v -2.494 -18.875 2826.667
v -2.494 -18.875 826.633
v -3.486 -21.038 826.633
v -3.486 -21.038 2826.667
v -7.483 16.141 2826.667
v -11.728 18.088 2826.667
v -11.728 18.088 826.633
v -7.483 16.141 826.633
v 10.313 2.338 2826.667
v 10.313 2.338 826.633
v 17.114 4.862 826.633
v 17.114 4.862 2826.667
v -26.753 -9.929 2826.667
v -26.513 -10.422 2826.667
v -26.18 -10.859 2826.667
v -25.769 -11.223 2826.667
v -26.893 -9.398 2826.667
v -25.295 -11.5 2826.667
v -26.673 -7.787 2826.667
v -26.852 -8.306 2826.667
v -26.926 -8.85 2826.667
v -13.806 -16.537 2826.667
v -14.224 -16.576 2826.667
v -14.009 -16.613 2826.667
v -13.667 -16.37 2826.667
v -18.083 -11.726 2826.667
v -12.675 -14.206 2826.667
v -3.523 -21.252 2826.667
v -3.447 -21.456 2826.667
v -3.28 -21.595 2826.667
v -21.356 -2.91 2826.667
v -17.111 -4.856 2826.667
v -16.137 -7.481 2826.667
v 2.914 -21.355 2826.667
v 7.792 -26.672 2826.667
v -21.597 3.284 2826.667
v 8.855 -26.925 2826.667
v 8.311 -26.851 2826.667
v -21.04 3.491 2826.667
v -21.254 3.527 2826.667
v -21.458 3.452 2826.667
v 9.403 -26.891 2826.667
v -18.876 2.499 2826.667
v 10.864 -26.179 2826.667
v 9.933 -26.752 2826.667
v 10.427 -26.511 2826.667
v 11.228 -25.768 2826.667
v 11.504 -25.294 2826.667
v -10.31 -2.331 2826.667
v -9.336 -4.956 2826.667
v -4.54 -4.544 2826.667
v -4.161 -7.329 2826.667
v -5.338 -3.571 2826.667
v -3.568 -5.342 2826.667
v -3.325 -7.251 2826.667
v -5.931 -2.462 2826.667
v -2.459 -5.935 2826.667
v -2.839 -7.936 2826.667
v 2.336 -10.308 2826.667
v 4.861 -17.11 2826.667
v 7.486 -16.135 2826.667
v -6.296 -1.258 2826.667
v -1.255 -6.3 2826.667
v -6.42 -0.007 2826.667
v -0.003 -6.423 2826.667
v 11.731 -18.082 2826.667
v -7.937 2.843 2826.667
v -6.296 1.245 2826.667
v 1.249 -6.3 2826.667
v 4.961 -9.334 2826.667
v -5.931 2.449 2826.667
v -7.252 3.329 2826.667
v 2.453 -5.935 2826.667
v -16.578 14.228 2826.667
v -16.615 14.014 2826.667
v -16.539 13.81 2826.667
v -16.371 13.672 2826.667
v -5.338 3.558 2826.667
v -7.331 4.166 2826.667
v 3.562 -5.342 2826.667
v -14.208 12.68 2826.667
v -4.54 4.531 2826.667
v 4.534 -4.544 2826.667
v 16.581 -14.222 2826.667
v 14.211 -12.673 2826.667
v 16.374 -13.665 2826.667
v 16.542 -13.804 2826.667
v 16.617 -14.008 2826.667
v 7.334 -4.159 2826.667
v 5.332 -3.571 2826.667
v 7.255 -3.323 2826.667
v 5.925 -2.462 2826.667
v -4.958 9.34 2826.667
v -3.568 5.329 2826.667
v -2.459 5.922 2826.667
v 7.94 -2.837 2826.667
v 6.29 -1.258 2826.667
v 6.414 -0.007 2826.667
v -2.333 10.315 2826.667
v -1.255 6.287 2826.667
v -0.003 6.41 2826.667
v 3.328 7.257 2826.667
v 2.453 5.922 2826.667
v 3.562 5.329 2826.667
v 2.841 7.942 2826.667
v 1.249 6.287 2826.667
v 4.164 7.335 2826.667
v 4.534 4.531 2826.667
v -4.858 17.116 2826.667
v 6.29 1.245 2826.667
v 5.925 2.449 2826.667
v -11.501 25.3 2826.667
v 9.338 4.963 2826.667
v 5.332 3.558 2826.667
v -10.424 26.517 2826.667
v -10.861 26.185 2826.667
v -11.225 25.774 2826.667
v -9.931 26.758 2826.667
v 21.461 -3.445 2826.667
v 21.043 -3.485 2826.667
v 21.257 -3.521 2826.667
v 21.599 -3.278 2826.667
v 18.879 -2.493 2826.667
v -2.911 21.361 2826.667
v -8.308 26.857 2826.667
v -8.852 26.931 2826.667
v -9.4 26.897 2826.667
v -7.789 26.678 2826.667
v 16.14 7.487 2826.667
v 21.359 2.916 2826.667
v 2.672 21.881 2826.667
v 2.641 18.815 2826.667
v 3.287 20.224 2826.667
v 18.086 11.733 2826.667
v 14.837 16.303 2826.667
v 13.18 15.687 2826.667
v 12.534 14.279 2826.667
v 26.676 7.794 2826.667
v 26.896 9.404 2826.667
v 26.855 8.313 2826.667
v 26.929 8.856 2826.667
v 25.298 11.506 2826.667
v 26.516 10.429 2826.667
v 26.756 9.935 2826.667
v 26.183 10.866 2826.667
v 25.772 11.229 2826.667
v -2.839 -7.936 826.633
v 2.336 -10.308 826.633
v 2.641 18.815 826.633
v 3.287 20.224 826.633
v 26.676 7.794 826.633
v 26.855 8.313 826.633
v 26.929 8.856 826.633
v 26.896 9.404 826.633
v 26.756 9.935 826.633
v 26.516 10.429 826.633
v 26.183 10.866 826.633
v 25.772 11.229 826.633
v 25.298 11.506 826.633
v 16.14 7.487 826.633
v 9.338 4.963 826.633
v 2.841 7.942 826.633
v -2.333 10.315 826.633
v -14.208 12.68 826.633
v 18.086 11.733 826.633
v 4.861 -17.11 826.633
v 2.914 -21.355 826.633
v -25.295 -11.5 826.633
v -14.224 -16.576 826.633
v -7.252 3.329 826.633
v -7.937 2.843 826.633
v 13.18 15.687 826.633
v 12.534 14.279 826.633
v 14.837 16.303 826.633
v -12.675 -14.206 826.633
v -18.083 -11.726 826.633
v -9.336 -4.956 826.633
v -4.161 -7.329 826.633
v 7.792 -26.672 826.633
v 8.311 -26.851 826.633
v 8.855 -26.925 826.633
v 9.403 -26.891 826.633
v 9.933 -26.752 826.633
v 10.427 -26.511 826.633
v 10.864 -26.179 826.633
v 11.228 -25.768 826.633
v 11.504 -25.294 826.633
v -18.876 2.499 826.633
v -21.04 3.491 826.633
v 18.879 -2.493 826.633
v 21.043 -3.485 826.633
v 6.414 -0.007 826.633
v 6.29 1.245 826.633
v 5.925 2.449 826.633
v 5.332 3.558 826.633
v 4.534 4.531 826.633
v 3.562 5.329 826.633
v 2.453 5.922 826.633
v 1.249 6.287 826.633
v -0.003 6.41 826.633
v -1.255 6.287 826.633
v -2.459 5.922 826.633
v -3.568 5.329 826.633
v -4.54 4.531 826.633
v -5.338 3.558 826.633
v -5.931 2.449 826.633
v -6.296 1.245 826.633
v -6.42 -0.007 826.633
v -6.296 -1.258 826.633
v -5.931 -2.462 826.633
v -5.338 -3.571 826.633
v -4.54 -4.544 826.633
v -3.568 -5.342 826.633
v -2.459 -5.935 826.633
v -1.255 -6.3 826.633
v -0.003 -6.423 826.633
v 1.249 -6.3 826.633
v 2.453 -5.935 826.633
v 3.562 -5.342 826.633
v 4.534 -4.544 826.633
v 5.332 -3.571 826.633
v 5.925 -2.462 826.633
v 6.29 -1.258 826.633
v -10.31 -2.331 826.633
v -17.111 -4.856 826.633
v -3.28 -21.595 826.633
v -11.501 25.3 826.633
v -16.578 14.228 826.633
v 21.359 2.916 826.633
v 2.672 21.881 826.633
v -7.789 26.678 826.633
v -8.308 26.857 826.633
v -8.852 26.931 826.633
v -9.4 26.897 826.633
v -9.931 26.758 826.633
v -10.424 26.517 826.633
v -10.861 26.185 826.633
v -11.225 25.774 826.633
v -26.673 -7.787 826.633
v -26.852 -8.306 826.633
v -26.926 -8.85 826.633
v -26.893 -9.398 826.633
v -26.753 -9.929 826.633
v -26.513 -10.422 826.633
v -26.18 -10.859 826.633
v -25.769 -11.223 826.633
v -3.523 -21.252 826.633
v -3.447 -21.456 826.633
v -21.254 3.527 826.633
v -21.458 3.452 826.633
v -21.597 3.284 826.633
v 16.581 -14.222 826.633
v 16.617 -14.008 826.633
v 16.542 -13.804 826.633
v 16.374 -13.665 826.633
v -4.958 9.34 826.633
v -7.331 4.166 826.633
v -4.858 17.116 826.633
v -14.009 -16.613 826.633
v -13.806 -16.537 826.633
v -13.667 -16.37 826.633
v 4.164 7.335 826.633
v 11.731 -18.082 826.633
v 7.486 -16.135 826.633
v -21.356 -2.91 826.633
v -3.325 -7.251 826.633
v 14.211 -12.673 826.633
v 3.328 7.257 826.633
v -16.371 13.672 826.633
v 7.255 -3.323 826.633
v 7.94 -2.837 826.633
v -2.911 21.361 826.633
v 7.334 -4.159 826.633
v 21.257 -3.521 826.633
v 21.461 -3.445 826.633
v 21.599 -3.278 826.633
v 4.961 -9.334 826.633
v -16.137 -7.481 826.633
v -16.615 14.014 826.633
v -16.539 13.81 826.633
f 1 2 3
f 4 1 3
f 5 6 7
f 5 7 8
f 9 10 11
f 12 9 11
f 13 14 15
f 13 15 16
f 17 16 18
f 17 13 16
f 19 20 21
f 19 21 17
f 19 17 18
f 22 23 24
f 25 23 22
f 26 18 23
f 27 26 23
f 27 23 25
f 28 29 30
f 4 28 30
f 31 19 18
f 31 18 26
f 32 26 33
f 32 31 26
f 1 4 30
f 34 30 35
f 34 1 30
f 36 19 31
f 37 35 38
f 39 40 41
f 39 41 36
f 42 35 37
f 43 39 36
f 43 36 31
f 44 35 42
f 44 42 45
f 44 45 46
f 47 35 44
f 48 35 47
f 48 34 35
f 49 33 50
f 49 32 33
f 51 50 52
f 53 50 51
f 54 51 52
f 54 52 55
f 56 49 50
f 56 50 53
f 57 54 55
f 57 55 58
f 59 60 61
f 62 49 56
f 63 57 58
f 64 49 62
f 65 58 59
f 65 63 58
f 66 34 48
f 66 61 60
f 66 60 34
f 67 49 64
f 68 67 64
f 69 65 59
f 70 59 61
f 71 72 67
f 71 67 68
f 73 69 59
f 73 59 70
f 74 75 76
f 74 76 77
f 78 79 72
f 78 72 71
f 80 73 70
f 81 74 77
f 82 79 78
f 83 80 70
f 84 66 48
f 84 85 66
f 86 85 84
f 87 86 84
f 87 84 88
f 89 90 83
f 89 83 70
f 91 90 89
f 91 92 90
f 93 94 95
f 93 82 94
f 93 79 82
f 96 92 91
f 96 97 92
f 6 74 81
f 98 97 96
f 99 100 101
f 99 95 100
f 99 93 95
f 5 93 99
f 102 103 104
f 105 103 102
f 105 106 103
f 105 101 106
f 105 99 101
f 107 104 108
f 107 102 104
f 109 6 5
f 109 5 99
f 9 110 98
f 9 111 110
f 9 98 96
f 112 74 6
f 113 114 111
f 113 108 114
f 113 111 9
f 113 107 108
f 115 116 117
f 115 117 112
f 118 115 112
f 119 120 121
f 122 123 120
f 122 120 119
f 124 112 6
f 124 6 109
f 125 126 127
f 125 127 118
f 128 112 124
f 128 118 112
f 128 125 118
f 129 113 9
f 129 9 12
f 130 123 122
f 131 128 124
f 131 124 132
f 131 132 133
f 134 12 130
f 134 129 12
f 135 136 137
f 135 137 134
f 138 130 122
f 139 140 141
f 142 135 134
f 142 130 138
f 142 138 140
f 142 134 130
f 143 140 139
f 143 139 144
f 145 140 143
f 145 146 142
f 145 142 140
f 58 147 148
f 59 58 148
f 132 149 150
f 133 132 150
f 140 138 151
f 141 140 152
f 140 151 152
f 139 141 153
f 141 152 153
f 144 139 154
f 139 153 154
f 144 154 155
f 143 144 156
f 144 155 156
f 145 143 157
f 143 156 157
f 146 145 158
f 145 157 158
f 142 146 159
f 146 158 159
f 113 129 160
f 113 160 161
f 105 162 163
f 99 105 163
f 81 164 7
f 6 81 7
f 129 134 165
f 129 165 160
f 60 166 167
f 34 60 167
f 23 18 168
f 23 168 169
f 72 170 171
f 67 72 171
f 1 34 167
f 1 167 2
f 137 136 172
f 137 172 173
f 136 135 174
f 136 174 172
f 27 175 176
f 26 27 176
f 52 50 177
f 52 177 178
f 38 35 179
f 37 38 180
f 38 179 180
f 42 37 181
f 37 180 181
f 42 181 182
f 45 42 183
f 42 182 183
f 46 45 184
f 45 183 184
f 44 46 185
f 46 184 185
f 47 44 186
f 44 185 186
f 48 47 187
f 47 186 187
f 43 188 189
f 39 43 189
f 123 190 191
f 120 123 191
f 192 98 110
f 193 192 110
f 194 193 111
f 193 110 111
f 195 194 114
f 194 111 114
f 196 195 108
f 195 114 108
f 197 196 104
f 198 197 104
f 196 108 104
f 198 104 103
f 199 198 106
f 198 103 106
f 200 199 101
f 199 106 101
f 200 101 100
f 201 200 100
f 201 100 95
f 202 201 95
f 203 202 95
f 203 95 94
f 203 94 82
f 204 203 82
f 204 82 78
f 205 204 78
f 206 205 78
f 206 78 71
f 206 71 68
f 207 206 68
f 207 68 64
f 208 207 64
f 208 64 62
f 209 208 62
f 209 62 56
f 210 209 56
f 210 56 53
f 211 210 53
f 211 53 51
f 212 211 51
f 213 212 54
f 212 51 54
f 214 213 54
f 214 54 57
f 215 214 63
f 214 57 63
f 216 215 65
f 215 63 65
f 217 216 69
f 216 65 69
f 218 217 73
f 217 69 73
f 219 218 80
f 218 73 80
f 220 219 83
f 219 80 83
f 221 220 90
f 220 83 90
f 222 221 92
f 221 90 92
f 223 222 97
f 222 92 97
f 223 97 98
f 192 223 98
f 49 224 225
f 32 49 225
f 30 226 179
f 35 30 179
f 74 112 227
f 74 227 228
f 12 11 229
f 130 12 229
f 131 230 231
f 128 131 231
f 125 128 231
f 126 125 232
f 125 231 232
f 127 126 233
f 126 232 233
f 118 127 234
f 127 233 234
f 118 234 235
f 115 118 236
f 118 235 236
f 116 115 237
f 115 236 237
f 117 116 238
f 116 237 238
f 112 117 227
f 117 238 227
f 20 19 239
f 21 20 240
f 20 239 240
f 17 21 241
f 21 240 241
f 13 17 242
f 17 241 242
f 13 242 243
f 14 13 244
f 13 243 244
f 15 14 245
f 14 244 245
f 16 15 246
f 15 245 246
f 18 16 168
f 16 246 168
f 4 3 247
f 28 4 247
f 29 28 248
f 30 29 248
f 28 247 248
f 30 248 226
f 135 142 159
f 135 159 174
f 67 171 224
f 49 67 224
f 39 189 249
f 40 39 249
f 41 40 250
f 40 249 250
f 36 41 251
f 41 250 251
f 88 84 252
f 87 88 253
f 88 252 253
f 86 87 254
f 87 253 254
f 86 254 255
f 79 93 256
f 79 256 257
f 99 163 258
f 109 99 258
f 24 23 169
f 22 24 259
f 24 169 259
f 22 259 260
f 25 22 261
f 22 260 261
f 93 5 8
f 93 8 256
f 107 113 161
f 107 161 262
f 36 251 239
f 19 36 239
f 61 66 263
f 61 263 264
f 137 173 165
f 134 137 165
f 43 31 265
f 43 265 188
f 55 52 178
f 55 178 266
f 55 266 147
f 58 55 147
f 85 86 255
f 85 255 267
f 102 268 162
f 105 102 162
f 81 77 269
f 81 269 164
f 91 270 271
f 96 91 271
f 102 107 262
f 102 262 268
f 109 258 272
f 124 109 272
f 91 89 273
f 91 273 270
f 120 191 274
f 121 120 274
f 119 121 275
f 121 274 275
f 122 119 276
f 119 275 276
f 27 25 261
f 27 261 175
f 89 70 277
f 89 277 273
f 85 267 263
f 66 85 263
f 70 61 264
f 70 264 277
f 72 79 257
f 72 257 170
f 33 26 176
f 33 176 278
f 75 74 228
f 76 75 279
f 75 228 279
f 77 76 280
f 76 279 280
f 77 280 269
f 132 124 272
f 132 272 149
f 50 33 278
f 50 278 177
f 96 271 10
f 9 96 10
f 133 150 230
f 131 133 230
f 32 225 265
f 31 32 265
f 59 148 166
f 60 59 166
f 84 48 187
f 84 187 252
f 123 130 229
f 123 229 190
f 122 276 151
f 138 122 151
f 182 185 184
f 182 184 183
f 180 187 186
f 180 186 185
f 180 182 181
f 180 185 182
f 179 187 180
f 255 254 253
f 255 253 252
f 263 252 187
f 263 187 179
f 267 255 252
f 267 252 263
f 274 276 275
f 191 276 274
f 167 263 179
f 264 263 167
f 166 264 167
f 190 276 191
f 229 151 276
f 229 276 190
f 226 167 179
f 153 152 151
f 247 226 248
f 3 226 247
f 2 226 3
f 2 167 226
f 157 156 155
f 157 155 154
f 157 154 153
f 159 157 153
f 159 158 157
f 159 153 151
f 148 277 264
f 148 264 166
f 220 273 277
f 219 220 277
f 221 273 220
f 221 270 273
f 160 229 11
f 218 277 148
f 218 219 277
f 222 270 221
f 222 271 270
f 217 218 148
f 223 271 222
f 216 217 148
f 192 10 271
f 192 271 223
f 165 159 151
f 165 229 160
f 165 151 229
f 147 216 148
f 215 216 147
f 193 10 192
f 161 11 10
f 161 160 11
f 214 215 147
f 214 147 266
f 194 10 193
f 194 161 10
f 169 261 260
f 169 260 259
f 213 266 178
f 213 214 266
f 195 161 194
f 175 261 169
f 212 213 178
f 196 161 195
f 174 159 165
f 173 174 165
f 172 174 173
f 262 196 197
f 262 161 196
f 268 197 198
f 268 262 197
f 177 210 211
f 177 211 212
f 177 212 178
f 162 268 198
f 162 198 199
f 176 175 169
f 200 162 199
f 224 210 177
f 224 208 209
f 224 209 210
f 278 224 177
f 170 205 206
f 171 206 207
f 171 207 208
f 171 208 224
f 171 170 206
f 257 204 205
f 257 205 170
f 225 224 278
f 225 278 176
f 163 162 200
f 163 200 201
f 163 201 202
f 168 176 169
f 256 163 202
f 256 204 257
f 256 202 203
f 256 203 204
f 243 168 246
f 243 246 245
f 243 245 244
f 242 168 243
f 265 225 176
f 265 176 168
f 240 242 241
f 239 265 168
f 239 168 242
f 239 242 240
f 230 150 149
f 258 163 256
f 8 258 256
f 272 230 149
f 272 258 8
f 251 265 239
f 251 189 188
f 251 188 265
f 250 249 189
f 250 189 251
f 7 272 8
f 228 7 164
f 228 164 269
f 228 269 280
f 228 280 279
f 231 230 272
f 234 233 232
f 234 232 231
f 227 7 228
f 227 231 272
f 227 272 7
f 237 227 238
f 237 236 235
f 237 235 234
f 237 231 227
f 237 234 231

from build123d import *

# Parameters (mm, degrees)
BOSS_EXTRUDE1_DEPTH = 2000
SCALE1_SCALE        = 3
SKETCH2_R           = 115.047789556
CUT_EXTRUDE1_DEPTH  = 1600
SKETCH3_R           = 13.75
CUT_EXTRUDE2_DEPTH  = 4401
SCALE2_SCALE        = 0.466666667
CUT_EXTRUDE3_DEPTH  = 53.3


with BuildPart() as part:
    # Sketch1 → Boss-Extrude1 (new body)
    with BuildSketch(Plane.XY):
        with BuildLine():
            Line((-8.216270499, 18.069114507), (-11.842563011, 10.160890774))
            ThreePointArc((-11.842563011, 10.160890774), (-11.851111664, 9.931439908), (-11.694910211, 9.763148835))
            Line((-11.694910211, 9.763148835), (-10.149625113, 9.054562941))
            Line((-10.149625113, 9.054562941), (-8.37816038, 12.917775685))
            Line((-8.37816038, 12.917775685), (-5.345959751, 11.527369089))
            Line((-5.345959751, 11.527369089), (-3.542521768, 6.669331059))
            Line((-3.542521768, 6.669331059), (-5.237363855, 2.973217088))
            Line((-5.237363855, 2.973217088), (-5.181250032, 2.375846818))
            Line((-5.181250032, 2.375846818), (-5.67053095, 2.028565688))
            Line((-5.67053095, 2.028565688), (-7.365373037, -1.667548284))
            Line((-7.365373037, -1.667548284), (-12.223411067, -3.470986267))
            Line((-12.223411067, -3.470986267), (-15.255611696, -2.080579672))
            Line((-15.255611696, -2.080579672), (-13.484146963, 1.782633072))
            Line((-13.484146963, 1.782633072), (-15.029432061, 2.491218965))
            ThreePointArc((-15.029432061, 2.491218965), (-15.258882927, 2.499767617), (-15.427174, 2.343566164))
            Line((-15.427174, 2.343566164), (-19.053466512, -5.564657569))
            ThreePointArc((-19.053466512, -5.564657569), (-19.110457529, -7.094330009), (-18.069114507, -8.216270499))
            Line((-18.069114507, -8.216270499), (-10.160890774, -11.842563011))
            ThreePointArc((-10.160890774, -11.842563011), (-9.931439908, -11.851111664), (-9.763148835, -11.694910211))
            Line((-9.763148835, -11.694910211), (-9.054562941, -10.149625113))
            Line((-9.054562941, -10.149625113), (-12.917775685, -8.37816038))
            Line((-12.917775685, -8.37816038), (-11.527369089, -5.345959751))
            Line((-11.527369089, -5.345959751), (-6.669331059, -3.542521768))
            Line((-6.669331059, -3.542521768), (-2.973217088, -5.237363855))
            Line((-2.973217088, -5.237363855), (-2.375846818, -5.181250032))
            Line((-2.375846818, -5.181250032), (-2.028565688, -5.67053095))
            Line((-2.028565688, -5.67053095), (1.667548284, -7.365373037))
            Line((1.667548284, -7.365373037), (3.470986267, -12.223411067))
            Line((3.470986267, -12.223411067), (2.080579672, -15.255611696))
            Line((2.080579672, -15.255611696), (-1.782633072, -13.484146963))
            Line((-1.782633072, -13.484146963), (-2.491218965, -15.029432061))
            ThreePointArc((-2.491218965, -15.029432061), (-2.499767617, -15.258882927), (-2.343566164, -15.427174))
            Line((-2.343566164, -15.427174), (5.564657569, -19.053466512))
            ThreePointArc((5.564657569, -19.053466512), (7.094330009, -19.110457529), (8.216270499, -18.069114507))
            Line((8.216270499, -18.069114507), (11.842563011, -10.160890774))
            ThreePointArc((11.842563011, -10.160890774), (11.851111664, -9.931439908), (11.694910211, -9.763148835))
            Line((11.694910211, -9.763148835), (10.149625113, -9.054562941))
            Line((10.149625113, -9.054562941), (8.37816038, -12.917775685))
            Line((8.37816038, -12.917775685), (5.345959751, -11.527369089))
            Line((5.345959751, -11.527369089), (3.542521768, -6.669331059))
            Line((3.542521768, -6.669331059), (5.237363855, -2.973217088))
            Line((5.237363855, -2.973217088), (5.181250032, -2.375846818))
            Line((5.181250032, -2.375846818), (5.67053095, -2.028565688))
            Line((5.67053095, -2.028565688), (7.365373037, 1.667548284))
            Line((7.365373037, 1.667548284), (12.223411067, 3.470986267))
            Line((12.223411067, 3.470986267), (15.255611696, 2.080579672))
            Line((15.255611696, 2.080579672), (13.484146963, -1.782633072))
            Line((13.484146963, -1.782633072), (15.029432061, -2.491218965))
            ThreePointArc((15.029432061, -2.491218965), (15.258882927, -2.499767617), (15.427174, -2.343566164))
            Line((15.427174, -2.343566164), (19.053466512, 5.564657569))
            ThreePointArc((19.053466512, 5.564657569), (19.110457529, 7.094330009), (18.069114507, 8.216270499))
            Line((18.069114507, 8.216270499), (10.597022809, 11.642575962))
            Line((10.597022809, 11.642575962), (9.413078742, 11.203063202))
            Line((9.413078742, 11.203063202), (8.951663933, 10.196809148))
            Line((8.951663933, 10.196809148), (12.917775685, 8.37816038))
            Line((12.917775685, 8.37816038), (11.527369089, 5.345959751))
            Line((11.527369089, 5.345959751), (6.669331059, 3.542521768))
            Line((6.669331059, 3.542521768), (2.973217088, 5.237363855))
            Line((2.973217088, 5.237363855), (2.375846818, 5.181250032))
            Line((2.375846818, 5.181250032), (2.028565688, 5.67053095))
            Line((2.028565688, 5.67053095), (-1.667548284, 7.365373037))
            Line((-1.667548284, 7.365373037), (-3.470986267, 12.223411067))
            Line((-3.470986267, 12.223411067), (-2.080579672, 15.255611696))
            Line((-2.080579672, 15.255611696), (1.88553208, 13.436962929))
            Line((1.88553208, 13.436962929), (2.346946889, 14.443216983))
            Line((2.346946889, 14.443216983), (1.907434129, 15.62716105))
            Line((1.907434129, 15.62716105), (-5.564657569, 19.053466512))
            ThreePointArc((-5.564657569, 19.053466512), (-7.094330009, 19.110457529), (-8.216270499, 18.069114507))
        make_face()
    extrude(amount=BOSS_EXTRUDE1_DEPTH)


with BuildPart() as part_1:
    # Scale1: scaled about (-0.00473582, -0.010327884, 1000)
    add(part.part.scale(SCALE1_SCALE).moved(Location((0.00947164, 0.020655768, -2000))))

    # Sketch2 → Cut-Extrude1 (cut)
    with BuildSketch(Plane(origin=(0, 0, -2000), x_dir=(-1, 0, 0), z_dir=(0, 0, -1))):
        Circle(SKETCH2_R)
    extrude(amount=-CUT_EXTRUDE1_DEPTH, mode=Mode.SUBTRACT)

    # Sketch3 → Cut-Extrude2 (cut, through all)
    with BuildSketch(Plane.XY.offset(4000)):
        Circle(SKETCH3_R)
    extrude(amount=-CUT_EXTRUDE2_DEPTH, mode=Mode.SUBTRACT)


with BuildPart() as part_2:
    # Scale2: scaled about (-0.005610815, -0.012236071, 1800)
    add(part_1.part.scale(SCALE2_SCALE).moved(Location((-0.002992435, -0.006525905, 960))))

    # Sketch6 → Cut-Extrude3 (cut)
    with BuildSketch(Plane(origin=(0, 0, 773.333333333), x_dir=(-1, 0, 0), z_dir=(0, 0, -1))):
        with BuildLine():
            Line((7.789092932, 26.67796657), (-2.671835446, 21.881138923))
            Line((-2.671835446, 21.881138923), (-3.287153309, 20.223617229))
            Line((-3.287153309, 20.223617229), (-2.641172576, 18.814861553))
            Line((-2.641172576, 18.814861553), (2.911383876, 21.360969828))
            Line((2.911383876, 21.360969828), (4.857953109, 17.115888947))
            Line((4.857953109, 17.115888947), (2.333139933, 10.314635704))
            Line((2.333139933, 10.314635704), (-2.841419627, 7.941856782))
            Line((-2.841419627, 7.941856782), (-3.32761321, 7.256863498))
            Line((-3.32761321, 7.256863498), (-4.163931587, 7.33542285))
            Line((-4.163931587, 7.33542285), (-9.338491147, 4.962643928))
            Line((-9.338491147, 4.962643928), (-16.13974439, 7.487457104))
            Line((-16.13974439, 7.487457104), (-18.086313623, 11.732537985))
            Line((-18.086313623, 11.732537985), (-12.533757171, 14.27864626))
            Line((-12.533757171, 14.27864626), (-13.179737904, 15.687401936))
            Line((-13.179737904, 15.687401936), (-14.837259597, 16.302719799))
            Line((-14.837259597, 16.302719799), (-25.298187975, 11.505892152))
            ThreePointArc((-25.298187975, 11.505892152), (-26.756068205, 9.935175466), (-26.676280782, 7.79363405))
            Line((-26.676280782, 7.79363405), (-21.599471265, -3.277879177))
            ThreePointArc((-21.599471265, -3.277879177), (-21.363863762, -3.496561211), (-21.04263255, -3.484593098))
            Line((-21.04263255, -3.484593098), (-18.879233413, -2.492572848))
            Line((-18.879233413, -2.492572848), (-21.359284039, 2.915924993))
            Line((-21.359284039, 2.915924993), (-17.114203158, 4.862494227))
            Line((-17.114203158, 4.862494227), (-10.312949916, 2.33768105))
            Line((-10.312949916, 2.33768105), (-7.940170994, -2.83687851))
            Line((-7.940170994, -2.83687851), (-7.25517771, -3.323072093))
            Line((-7.25517771, -3.323072093), (-7.333737061, -4.15939047))
            Line((-7.333737061, -4.15939047), (-4.960958139, -9.33395003))
            Line((-4.960958139, -9.33395003), (-7.485771316, -16.135203272))
            Line((-7.485771316, -16.135203272), (-11.730852197, -18.081772506))
            Line((-11.730852197, -18.081772506), (-14.210902823, -12.673274665))
            Line((-14.210902823, -12.673274665), (-16.374301959, -13.665294916))
            ThreePointArc((-16.374301959, -13.665294916), (-16.592983994, -13.900902418), (-16.58101588, -14.222133631))
            Line((-16.58101588, -14.222133631), (-11.504206363, -25.293646858))
            ThreePointArc((-11.504206363, -25.293646858), (-9.933489678, -26.751527087), (-7.791948261, -26.671739664))
            Line((-7.791948261, -26.671739664), (3.279564965, -21.594930148))
            ThreePointArc((3.279564965, -21.594930148), (3.498247, -21.359322645), (3.486278886, -21.038091432))
            Line((3.486278886, -21.038091432), (2.494258636, -18.874692296))
            Line((2.494258636, -18.874692296), (-2.914239205, -21.354742922))
            Line((-2.914239205, -21.354742922), (-4.860808438, -17.109662041))
            Line((-4.860808438, -17.109662041), (-2.335995262, -10.308408799))
            Line((-2.335995262, -10.308408799), (2.838564298, -7.935629877))
            Line((2.838564298, -7.935629877), (3.324757881, -7.250636592))
            Line((3.324757881, -7.250636592), (4.161076258, -7.329195944))
            Line((4.161076258, -7.329195944), (9.335635818, -4.956417022))
            Line((9.335635818, -4.956417022), (16.13688906, -7.481230198))
            Line((16.13688906, -7.481230198), (18.083458294, -11.72631108))
            Line((18.083458294, -11.72631108), (12.674960453, -14.206361706))
            Line((12.674960453, -14.206361706), (13.666980704, -16.369760842))
            ThreePointArc((13.666980704, -16.369760842), (13.902588207, -16.588442876), (14.223819419, -16.576474763))
            Line((14.223819419, -16.576474763), (25.295332646, -11.499665246))
            ThreePointArc((25.295332646, -11.499665246), (26.753212876, -9.92894856), (26.673425453, -7.787407144))
            Line((26.673425453, -7.787407144), (21.596615936, 3.284106083))
            ThreePointArc((21.596615936, 3.284106083), (21.361008433, 3.502788117), (21.039777221, 3.490820004))
            Line((21.039777221, 3.490820004), (18.876378084, 2.498799753))
            Line((18.876378084, 2.498799753), (21.35642871, -2.909698087))
            Line((21.35642871, -2.909698087), (17.111347829, -4.856267321))
            Line((17.111347829, -4.856267321), (10.310094587, -2.331454145))
            Line((10.310094587, -2.331454145), (7.937315665, 2.843105415))
            Line((7.937315665, 2.843105415), (7.252322381, 3.329298998))
            Line((7.252322381, 3.329298998), (7.330881732, 4.165617376))
            Line((7.330881732, 4.165617376), (4.95810281, 9.340176936))
            Line((4.95810281, 9.340176936), (7.482915987, 16.141430178))
            Line((7.482915987, 16.141430178), (11.727996868, 18.087999412))
            Line((11.727996868, 18.087999412), (14.208047494, 12.679501571))
            Line((14.208047494, 12.679501571), (16.37144663, 13.671521821))
            ThreePointArc((16.37144663, 13.671521821), (16.590128665, 13.907129324), (16.578160551, 14.228360537))
            Line((16.578160551, 14.228360537), (11.501351034, 25.299873763))
            ThreePointArc((11.501351034, 25.299873763), (9.930634349, 26.757753993), (7.789092932, 26.67796657))
        make_face()
    extrude(amount=-CUT_EXTRUDE3_DEPTH, mode=Mode.SUBTRACT)


solid = part_2.part
